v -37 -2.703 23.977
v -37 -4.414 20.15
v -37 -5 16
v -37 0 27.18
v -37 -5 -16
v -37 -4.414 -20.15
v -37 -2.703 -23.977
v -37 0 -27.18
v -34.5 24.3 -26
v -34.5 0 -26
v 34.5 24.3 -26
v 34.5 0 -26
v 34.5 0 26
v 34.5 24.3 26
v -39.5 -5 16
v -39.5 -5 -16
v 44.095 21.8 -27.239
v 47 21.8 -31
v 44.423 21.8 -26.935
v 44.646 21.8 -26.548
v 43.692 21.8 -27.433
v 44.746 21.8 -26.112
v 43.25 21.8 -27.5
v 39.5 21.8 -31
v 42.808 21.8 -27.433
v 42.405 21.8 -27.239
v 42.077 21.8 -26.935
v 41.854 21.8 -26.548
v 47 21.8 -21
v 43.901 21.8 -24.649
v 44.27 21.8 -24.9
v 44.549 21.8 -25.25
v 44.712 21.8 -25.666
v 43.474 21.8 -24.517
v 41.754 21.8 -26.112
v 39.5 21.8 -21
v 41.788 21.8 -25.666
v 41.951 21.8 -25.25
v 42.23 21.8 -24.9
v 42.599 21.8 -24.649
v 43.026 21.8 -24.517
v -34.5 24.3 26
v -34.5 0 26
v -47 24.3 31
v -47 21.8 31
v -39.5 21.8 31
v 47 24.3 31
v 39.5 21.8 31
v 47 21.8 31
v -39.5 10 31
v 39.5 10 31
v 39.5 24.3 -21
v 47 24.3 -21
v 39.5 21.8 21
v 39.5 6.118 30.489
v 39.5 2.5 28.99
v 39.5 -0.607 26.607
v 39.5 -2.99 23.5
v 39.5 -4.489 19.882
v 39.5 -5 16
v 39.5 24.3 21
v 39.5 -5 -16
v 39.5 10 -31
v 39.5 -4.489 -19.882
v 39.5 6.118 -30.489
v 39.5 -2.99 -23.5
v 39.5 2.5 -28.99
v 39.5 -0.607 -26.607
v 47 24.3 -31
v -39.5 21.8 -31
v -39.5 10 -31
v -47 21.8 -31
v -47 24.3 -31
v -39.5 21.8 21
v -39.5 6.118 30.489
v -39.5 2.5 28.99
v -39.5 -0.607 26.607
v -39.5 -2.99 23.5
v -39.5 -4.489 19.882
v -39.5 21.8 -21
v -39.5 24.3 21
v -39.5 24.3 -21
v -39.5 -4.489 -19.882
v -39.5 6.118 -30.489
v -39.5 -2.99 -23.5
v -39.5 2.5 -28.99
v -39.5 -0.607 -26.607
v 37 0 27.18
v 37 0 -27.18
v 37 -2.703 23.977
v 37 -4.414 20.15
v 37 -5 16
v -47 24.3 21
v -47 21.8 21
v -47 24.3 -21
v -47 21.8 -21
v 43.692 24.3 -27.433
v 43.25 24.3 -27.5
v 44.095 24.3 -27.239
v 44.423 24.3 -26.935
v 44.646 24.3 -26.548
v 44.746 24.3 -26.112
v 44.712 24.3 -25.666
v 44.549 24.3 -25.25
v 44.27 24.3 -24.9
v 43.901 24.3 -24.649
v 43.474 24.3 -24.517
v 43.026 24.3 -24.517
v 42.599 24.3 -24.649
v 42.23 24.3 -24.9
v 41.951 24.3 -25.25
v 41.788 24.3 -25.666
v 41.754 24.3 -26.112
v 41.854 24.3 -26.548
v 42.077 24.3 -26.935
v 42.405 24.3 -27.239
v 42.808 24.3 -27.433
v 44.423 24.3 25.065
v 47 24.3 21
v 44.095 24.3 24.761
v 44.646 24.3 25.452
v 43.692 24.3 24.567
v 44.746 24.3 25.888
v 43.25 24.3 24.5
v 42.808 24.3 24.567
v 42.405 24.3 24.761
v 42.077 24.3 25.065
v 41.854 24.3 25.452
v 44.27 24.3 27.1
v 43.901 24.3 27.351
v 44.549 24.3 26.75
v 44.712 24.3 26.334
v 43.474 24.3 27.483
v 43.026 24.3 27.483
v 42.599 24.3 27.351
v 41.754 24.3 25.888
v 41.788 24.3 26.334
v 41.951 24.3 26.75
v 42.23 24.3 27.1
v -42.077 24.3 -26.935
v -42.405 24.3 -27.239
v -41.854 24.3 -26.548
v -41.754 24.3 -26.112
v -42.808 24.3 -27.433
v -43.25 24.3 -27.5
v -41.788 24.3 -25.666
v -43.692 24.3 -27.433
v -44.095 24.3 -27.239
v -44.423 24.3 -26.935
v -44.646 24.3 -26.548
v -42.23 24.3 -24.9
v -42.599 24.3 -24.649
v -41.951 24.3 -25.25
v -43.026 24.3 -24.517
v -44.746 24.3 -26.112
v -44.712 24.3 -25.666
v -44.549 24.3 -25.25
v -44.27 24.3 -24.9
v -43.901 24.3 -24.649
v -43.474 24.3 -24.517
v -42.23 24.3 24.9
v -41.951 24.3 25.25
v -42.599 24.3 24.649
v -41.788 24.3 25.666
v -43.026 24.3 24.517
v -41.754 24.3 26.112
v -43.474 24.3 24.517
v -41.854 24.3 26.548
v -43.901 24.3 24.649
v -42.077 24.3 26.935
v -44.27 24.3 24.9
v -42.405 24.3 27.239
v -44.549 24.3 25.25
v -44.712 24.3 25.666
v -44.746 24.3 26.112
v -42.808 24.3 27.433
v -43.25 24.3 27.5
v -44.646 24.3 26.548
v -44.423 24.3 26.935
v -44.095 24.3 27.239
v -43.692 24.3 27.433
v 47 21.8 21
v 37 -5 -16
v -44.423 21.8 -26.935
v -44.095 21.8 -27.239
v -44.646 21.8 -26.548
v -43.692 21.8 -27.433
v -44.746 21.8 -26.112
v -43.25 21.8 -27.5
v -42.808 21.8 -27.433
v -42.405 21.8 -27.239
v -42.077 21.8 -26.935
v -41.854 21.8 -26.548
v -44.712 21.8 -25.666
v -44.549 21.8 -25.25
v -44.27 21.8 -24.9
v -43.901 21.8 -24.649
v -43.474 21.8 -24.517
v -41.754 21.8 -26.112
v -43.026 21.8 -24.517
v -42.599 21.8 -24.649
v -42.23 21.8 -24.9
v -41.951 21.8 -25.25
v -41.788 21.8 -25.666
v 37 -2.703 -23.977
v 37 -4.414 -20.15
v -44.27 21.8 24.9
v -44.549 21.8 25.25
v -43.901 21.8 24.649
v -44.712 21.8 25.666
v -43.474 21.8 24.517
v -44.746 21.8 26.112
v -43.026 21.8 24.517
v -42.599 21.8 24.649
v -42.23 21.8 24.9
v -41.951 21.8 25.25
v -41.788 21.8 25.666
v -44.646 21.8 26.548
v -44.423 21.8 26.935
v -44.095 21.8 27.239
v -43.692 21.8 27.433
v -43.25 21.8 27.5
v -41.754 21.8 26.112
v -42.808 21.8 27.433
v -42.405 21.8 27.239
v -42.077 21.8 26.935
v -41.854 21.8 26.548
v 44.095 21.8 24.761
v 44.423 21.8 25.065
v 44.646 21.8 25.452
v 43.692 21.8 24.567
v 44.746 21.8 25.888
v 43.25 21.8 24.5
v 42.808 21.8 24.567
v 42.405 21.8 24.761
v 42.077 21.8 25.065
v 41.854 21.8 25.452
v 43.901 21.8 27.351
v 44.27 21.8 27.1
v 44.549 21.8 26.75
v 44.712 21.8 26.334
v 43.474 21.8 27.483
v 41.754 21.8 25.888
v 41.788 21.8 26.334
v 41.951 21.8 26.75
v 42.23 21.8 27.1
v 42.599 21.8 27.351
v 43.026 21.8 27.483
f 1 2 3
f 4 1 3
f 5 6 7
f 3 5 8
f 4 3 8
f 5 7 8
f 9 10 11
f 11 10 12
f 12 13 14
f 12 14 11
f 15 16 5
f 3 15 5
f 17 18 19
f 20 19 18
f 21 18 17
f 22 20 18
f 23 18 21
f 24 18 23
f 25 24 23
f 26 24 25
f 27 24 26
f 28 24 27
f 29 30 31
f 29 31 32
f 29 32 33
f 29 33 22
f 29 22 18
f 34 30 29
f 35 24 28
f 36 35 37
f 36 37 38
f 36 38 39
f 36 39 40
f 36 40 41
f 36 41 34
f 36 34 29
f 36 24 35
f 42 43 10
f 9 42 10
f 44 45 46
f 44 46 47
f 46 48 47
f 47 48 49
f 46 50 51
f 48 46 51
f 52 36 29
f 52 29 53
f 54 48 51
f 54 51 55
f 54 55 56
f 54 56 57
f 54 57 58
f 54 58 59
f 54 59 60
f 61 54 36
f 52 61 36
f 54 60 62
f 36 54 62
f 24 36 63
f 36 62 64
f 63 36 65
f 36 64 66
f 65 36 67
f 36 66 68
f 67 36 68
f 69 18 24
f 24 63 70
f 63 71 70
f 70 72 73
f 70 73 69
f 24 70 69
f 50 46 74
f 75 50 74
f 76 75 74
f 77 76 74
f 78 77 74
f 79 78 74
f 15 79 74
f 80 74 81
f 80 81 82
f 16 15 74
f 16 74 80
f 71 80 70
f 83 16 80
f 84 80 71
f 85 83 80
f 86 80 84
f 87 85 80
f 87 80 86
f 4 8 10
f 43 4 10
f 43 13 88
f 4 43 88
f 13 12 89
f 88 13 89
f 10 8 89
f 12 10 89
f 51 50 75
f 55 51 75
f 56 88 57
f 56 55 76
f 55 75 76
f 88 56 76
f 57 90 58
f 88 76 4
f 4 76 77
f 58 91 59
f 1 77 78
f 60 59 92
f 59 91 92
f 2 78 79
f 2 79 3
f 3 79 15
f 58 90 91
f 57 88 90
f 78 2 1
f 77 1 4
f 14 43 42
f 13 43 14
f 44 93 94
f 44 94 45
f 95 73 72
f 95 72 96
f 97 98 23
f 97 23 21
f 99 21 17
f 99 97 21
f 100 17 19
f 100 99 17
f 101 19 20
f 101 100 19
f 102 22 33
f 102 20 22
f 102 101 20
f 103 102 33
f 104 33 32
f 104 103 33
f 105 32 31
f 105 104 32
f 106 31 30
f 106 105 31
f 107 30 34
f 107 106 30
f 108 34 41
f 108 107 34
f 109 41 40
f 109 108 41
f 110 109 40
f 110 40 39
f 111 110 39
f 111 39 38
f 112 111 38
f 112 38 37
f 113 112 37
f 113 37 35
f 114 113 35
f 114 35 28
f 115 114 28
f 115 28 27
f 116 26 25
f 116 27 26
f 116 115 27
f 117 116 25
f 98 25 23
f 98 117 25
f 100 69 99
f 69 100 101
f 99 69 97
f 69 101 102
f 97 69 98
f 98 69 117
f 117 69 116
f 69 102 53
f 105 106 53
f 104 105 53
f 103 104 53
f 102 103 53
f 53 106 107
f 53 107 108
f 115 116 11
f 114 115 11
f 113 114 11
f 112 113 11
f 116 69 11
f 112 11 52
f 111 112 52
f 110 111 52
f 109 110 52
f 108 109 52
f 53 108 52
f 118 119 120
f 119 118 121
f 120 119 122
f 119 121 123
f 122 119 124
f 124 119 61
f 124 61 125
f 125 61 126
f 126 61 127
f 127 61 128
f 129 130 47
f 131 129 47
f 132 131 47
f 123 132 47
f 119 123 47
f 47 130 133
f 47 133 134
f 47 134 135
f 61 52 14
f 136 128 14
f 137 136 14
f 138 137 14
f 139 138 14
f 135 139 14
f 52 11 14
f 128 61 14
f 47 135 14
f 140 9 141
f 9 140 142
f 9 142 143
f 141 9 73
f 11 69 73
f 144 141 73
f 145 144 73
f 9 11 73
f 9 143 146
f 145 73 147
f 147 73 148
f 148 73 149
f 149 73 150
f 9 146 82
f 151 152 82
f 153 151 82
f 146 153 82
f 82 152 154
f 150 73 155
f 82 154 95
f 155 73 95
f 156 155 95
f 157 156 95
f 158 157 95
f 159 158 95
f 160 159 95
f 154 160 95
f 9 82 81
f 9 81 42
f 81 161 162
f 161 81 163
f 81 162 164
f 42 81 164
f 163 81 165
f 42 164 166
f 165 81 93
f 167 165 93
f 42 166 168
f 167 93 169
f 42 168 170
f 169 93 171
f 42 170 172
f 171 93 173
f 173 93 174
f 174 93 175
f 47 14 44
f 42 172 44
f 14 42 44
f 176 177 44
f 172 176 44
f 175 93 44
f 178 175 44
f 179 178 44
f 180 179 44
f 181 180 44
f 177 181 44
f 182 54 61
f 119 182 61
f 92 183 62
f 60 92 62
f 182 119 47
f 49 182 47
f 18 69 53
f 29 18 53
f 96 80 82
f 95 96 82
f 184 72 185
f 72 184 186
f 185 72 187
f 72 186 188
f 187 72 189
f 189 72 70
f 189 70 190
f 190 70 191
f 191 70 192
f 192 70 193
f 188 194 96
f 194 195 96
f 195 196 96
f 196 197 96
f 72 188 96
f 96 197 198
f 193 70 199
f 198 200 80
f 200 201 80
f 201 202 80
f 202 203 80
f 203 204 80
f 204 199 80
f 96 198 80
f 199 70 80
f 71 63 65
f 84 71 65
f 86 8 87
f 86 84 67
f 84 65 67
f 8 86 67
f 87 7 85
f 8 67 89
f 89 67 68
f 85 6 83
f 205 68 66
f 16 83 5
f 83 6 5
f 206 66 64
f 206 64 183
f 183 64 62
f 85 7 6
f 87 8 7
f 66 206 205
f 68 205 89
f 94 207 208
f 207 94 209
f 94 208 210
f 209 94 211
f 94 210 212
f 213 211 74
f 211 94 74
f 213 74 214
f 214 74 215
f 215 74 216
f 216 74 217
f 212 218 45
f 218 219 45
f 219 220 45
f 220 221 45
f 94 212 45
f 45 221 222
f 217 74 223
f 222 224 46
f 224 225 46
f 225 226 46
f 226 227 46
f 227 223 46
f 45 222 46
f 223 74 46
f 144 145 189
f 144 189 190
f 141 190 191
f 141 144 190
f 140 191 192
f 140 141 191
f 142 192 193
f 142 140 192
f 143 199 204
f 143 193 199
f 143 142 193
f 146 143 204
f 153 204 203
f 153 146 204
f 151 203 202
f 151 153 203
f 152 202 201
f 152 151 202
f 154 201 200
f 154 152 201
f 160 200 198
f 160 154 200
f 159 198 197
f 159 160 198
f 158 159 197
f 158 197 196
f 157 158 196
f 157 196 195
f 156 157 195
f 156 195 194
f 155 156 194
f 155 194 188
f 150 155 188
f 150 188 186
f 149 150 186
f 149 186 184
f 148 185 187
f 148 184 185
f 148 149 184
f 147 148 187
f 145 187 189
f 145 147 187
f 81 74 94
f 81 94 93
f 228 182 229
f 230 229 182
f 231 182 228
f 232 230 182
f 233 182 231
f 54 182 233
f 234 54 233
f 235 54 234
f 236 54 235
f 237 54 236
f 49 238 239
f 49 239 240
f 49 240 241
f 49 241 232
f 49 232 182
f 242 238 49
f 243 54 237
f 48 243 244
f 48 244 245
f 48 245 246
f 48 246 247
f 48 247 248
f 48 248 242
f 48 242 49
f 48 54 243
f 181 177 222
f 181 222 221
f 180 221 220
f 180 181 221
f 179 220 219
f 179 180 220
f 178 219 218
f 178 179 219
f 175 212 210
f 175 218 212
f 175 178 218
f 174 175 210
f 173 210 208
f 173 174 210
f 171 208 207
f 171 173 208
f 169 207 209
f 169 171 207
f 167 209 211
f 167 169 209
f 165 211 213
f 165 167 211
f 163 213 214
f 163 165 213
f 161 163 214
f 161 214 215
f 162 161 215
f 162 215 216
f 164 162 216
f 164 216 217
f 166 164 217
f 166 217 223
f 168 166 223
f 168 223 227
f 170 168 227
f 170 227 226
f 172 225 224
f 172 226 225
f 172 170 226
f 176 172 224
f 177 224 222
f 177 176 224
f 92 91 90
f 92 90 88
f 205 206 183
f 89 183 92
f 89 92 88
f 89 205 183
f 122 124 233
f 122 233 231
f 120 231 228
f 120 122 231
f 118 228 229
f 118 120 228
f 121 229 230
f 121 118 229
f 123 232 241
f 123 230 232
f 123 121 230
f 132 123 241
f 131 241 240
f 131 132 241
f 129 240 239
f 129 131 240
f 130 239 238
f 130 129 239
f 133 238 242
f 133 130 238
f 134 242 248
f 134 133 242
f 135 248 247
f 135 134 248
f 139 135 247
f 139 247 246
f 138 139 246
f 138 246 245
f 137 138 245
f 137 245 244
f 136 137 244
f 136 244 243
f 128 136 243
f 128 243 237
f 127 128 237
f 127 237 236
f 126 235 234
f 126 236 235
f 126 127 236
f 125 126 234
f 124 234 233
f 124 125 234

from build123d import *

# Parameters (mm, degrees)
SKETCH1_W                 = 79
SKETCH1_H                 = 62
SKETCH1_W_2               = 69
SKETCH1_H_2               = 52
BOSS_EXTRUDE1_DEPTH       = 24.3
BOSS_EXTRUDE2_START       = -5
BOSS_EXTRUDE2_OUTLINE_W   = 79
BOSS_EXTRUDE2_OUTLINE_H   = 62
BOSS_EXTRUDE2_OUTLINE_W_2 = 74
BOSS_EXTRUDE2_OUTLINE_H_2 = 57
BOSS_EXTRUDE2_DEPTH       = 5
SKETCH3_W                 = 10
SKETCH3_H                 = 2.5
BOSS_EXTRUDE3_DEPTH       = 7.5
CUT_EXTRUDE1_DEPTH        = 63.355753544
CUT_EXTRUDE1_DEPTH_BACK   = 63.355753544
SKETCH4_R                 = 1.5
FILLET1_R                 = 15


# Read off the part's stored shape, not the designer's step: Boss-Extrude2
with BuildPart() as part:
    # Sketch1 → Boss-Extrude1 (new body)
    with BuildSketch(Plane(origin=(0, 0, 0), x_dir=(1, 0, 0), z_dir=(0, 1, 0))):
        Rectangle(SKETCH1_W, SKETCH1_H)
        Rectangle(SKETCH1_W_2, SKETCH1_H_2, mode=Mode.SUBTRACT)
    extrude(amount=BOSS_EXTRUDE1_DEPTH)

    # Boss-Extrude2 outline → Boss-Extrude2 (add)
    with BuildSketch(Plane(origin=(0, 0, 0), x_dir=(1, 0, 0), z_dir=(0, 1, 0)).offset(BOSS_EXTRUDE2_START)):
        Rectangle(BOSS_EXTRUDE2_OUTLINE_W, BOSS_EXTRUDE2_OUTLINE_H)
        Rectangle(BOSS_EXTRUDE2_OUTLINE_W_2, BOSS_EXTRUDE2_OUTLINE_H_2, mode=Mode.SUBTRACT)
    extrude(amount=BOSS_EXTRUDE2_DEPTH)

    # Sketch3 → Boss-Extrude3 (add)
    with BuildSketch(Plane.ZY.offset(39.5)):
        with Locations((-26, 23.05)):
            Rectangle(SKETCH3_W, SKETCH3_H)
        with Locations((26, 23.05)):
            Rectangle(SKETCH3_W, SKETCH3_H)
    boss_extrude3 = extrude(amount=BOSS_EXTRUDE3_DEPTH)

    # Mirror1: Boss-Extrude3 across plane
    add(boss_extrude3.mirror(Plane.ZY))

    # Sketch4 → Cut-Extrude1 (cut, two sides: drawn at the far end of the back side and taken through both)
    with BuildSketch(Plane.XZ.offset(-21.8).offset(-CUT_EXTRUDE1_DEPTH_BACK)):
        with Locations(Location((43.25, 26, 0), (0, 0, 270))):
            Circle(SKETCH4_R)
        with Locations(Location((-43.25, 26, 0), (0, 0, 90))):
            Circle(SKETCH4_R)
        with Locations(Location((-43.25, -26, 0), (0, 0, 270))):
            Circle(SKETCH4_R)
        with Locations(Location((43.25, -26, 0), (0, 0, 270))):
            Circle(SKETCH4_R)
    extrude(amount=CUT_EXTRUDE1_DEPTH + CUT_EXTRUDE1_DEPTH_BACK, mode=Mode.SUBTRACT)

    # Fillet1
    # the kernel refuses this fillet: 15 mm, written as the material it takes off along each edge
    with BuildSketch(Plane(origin=(-77, -5, 31), x_dir=(0, 1, 0), z_dir=(1, 0, 0))) as fillet1_piece_1:
        with BuildLine():
            CenterArc((FILLET1_R, -FILLET1_R), FILLET1_R, 90, 90)
            Line((0, -FILLET1_R), (-FILLET1_R * 0.02, -FILLET1_R))
            Line((-FILLET1_R * 0.02, -FILLET1_R), (-FILLET1_R * 0.02, FILLET1_R * 0.02))
            Line((-FILLET1_R * 0.02, FILLET1_R * 0.02), (FILLET1_R, FILLET1_R * 0.02))
            Line((FILLET1_R, FILLET1_R * 0.02), (FILLET1_R, 0))
        make_face()
    extrude(amount=154, mode=Mode.SUBTRACT)
    # the kernel refuses this fillet: 15 mm, written as the material it takes off along each edge
    with BuildSketch(Plane(origin=(77, -5, -31), x_dir=(0, 1, 0), z_dir=(-1, 0, 0))) as fillet1_2_piece_1:
        with BuildLine():
            CenterArc((FILLET1_R, -FILLET1_R), FILLET1_R, 90, 90)
            Line((0, -FILLET1_R), (-FILLET1_R * 0.02, -FILLET1_R))
            Line((-FILLET1_R * 0.02, -FILLET1_R), (-FILLET1_R * 0.02, FILLET1_R * 0.02))
            Line((-FILLET1_R * 0.02, FILLET1_R * 0.02), (FILLET1_R, FILLET1_R * 0.02))
            Line((FILLET1_R, FILLET1_R * 0.02), (FILLET1_R, 0))
        make_face()
    extrude(amount=154, mode=Mode.SUBTRACT)


solid = part.part
